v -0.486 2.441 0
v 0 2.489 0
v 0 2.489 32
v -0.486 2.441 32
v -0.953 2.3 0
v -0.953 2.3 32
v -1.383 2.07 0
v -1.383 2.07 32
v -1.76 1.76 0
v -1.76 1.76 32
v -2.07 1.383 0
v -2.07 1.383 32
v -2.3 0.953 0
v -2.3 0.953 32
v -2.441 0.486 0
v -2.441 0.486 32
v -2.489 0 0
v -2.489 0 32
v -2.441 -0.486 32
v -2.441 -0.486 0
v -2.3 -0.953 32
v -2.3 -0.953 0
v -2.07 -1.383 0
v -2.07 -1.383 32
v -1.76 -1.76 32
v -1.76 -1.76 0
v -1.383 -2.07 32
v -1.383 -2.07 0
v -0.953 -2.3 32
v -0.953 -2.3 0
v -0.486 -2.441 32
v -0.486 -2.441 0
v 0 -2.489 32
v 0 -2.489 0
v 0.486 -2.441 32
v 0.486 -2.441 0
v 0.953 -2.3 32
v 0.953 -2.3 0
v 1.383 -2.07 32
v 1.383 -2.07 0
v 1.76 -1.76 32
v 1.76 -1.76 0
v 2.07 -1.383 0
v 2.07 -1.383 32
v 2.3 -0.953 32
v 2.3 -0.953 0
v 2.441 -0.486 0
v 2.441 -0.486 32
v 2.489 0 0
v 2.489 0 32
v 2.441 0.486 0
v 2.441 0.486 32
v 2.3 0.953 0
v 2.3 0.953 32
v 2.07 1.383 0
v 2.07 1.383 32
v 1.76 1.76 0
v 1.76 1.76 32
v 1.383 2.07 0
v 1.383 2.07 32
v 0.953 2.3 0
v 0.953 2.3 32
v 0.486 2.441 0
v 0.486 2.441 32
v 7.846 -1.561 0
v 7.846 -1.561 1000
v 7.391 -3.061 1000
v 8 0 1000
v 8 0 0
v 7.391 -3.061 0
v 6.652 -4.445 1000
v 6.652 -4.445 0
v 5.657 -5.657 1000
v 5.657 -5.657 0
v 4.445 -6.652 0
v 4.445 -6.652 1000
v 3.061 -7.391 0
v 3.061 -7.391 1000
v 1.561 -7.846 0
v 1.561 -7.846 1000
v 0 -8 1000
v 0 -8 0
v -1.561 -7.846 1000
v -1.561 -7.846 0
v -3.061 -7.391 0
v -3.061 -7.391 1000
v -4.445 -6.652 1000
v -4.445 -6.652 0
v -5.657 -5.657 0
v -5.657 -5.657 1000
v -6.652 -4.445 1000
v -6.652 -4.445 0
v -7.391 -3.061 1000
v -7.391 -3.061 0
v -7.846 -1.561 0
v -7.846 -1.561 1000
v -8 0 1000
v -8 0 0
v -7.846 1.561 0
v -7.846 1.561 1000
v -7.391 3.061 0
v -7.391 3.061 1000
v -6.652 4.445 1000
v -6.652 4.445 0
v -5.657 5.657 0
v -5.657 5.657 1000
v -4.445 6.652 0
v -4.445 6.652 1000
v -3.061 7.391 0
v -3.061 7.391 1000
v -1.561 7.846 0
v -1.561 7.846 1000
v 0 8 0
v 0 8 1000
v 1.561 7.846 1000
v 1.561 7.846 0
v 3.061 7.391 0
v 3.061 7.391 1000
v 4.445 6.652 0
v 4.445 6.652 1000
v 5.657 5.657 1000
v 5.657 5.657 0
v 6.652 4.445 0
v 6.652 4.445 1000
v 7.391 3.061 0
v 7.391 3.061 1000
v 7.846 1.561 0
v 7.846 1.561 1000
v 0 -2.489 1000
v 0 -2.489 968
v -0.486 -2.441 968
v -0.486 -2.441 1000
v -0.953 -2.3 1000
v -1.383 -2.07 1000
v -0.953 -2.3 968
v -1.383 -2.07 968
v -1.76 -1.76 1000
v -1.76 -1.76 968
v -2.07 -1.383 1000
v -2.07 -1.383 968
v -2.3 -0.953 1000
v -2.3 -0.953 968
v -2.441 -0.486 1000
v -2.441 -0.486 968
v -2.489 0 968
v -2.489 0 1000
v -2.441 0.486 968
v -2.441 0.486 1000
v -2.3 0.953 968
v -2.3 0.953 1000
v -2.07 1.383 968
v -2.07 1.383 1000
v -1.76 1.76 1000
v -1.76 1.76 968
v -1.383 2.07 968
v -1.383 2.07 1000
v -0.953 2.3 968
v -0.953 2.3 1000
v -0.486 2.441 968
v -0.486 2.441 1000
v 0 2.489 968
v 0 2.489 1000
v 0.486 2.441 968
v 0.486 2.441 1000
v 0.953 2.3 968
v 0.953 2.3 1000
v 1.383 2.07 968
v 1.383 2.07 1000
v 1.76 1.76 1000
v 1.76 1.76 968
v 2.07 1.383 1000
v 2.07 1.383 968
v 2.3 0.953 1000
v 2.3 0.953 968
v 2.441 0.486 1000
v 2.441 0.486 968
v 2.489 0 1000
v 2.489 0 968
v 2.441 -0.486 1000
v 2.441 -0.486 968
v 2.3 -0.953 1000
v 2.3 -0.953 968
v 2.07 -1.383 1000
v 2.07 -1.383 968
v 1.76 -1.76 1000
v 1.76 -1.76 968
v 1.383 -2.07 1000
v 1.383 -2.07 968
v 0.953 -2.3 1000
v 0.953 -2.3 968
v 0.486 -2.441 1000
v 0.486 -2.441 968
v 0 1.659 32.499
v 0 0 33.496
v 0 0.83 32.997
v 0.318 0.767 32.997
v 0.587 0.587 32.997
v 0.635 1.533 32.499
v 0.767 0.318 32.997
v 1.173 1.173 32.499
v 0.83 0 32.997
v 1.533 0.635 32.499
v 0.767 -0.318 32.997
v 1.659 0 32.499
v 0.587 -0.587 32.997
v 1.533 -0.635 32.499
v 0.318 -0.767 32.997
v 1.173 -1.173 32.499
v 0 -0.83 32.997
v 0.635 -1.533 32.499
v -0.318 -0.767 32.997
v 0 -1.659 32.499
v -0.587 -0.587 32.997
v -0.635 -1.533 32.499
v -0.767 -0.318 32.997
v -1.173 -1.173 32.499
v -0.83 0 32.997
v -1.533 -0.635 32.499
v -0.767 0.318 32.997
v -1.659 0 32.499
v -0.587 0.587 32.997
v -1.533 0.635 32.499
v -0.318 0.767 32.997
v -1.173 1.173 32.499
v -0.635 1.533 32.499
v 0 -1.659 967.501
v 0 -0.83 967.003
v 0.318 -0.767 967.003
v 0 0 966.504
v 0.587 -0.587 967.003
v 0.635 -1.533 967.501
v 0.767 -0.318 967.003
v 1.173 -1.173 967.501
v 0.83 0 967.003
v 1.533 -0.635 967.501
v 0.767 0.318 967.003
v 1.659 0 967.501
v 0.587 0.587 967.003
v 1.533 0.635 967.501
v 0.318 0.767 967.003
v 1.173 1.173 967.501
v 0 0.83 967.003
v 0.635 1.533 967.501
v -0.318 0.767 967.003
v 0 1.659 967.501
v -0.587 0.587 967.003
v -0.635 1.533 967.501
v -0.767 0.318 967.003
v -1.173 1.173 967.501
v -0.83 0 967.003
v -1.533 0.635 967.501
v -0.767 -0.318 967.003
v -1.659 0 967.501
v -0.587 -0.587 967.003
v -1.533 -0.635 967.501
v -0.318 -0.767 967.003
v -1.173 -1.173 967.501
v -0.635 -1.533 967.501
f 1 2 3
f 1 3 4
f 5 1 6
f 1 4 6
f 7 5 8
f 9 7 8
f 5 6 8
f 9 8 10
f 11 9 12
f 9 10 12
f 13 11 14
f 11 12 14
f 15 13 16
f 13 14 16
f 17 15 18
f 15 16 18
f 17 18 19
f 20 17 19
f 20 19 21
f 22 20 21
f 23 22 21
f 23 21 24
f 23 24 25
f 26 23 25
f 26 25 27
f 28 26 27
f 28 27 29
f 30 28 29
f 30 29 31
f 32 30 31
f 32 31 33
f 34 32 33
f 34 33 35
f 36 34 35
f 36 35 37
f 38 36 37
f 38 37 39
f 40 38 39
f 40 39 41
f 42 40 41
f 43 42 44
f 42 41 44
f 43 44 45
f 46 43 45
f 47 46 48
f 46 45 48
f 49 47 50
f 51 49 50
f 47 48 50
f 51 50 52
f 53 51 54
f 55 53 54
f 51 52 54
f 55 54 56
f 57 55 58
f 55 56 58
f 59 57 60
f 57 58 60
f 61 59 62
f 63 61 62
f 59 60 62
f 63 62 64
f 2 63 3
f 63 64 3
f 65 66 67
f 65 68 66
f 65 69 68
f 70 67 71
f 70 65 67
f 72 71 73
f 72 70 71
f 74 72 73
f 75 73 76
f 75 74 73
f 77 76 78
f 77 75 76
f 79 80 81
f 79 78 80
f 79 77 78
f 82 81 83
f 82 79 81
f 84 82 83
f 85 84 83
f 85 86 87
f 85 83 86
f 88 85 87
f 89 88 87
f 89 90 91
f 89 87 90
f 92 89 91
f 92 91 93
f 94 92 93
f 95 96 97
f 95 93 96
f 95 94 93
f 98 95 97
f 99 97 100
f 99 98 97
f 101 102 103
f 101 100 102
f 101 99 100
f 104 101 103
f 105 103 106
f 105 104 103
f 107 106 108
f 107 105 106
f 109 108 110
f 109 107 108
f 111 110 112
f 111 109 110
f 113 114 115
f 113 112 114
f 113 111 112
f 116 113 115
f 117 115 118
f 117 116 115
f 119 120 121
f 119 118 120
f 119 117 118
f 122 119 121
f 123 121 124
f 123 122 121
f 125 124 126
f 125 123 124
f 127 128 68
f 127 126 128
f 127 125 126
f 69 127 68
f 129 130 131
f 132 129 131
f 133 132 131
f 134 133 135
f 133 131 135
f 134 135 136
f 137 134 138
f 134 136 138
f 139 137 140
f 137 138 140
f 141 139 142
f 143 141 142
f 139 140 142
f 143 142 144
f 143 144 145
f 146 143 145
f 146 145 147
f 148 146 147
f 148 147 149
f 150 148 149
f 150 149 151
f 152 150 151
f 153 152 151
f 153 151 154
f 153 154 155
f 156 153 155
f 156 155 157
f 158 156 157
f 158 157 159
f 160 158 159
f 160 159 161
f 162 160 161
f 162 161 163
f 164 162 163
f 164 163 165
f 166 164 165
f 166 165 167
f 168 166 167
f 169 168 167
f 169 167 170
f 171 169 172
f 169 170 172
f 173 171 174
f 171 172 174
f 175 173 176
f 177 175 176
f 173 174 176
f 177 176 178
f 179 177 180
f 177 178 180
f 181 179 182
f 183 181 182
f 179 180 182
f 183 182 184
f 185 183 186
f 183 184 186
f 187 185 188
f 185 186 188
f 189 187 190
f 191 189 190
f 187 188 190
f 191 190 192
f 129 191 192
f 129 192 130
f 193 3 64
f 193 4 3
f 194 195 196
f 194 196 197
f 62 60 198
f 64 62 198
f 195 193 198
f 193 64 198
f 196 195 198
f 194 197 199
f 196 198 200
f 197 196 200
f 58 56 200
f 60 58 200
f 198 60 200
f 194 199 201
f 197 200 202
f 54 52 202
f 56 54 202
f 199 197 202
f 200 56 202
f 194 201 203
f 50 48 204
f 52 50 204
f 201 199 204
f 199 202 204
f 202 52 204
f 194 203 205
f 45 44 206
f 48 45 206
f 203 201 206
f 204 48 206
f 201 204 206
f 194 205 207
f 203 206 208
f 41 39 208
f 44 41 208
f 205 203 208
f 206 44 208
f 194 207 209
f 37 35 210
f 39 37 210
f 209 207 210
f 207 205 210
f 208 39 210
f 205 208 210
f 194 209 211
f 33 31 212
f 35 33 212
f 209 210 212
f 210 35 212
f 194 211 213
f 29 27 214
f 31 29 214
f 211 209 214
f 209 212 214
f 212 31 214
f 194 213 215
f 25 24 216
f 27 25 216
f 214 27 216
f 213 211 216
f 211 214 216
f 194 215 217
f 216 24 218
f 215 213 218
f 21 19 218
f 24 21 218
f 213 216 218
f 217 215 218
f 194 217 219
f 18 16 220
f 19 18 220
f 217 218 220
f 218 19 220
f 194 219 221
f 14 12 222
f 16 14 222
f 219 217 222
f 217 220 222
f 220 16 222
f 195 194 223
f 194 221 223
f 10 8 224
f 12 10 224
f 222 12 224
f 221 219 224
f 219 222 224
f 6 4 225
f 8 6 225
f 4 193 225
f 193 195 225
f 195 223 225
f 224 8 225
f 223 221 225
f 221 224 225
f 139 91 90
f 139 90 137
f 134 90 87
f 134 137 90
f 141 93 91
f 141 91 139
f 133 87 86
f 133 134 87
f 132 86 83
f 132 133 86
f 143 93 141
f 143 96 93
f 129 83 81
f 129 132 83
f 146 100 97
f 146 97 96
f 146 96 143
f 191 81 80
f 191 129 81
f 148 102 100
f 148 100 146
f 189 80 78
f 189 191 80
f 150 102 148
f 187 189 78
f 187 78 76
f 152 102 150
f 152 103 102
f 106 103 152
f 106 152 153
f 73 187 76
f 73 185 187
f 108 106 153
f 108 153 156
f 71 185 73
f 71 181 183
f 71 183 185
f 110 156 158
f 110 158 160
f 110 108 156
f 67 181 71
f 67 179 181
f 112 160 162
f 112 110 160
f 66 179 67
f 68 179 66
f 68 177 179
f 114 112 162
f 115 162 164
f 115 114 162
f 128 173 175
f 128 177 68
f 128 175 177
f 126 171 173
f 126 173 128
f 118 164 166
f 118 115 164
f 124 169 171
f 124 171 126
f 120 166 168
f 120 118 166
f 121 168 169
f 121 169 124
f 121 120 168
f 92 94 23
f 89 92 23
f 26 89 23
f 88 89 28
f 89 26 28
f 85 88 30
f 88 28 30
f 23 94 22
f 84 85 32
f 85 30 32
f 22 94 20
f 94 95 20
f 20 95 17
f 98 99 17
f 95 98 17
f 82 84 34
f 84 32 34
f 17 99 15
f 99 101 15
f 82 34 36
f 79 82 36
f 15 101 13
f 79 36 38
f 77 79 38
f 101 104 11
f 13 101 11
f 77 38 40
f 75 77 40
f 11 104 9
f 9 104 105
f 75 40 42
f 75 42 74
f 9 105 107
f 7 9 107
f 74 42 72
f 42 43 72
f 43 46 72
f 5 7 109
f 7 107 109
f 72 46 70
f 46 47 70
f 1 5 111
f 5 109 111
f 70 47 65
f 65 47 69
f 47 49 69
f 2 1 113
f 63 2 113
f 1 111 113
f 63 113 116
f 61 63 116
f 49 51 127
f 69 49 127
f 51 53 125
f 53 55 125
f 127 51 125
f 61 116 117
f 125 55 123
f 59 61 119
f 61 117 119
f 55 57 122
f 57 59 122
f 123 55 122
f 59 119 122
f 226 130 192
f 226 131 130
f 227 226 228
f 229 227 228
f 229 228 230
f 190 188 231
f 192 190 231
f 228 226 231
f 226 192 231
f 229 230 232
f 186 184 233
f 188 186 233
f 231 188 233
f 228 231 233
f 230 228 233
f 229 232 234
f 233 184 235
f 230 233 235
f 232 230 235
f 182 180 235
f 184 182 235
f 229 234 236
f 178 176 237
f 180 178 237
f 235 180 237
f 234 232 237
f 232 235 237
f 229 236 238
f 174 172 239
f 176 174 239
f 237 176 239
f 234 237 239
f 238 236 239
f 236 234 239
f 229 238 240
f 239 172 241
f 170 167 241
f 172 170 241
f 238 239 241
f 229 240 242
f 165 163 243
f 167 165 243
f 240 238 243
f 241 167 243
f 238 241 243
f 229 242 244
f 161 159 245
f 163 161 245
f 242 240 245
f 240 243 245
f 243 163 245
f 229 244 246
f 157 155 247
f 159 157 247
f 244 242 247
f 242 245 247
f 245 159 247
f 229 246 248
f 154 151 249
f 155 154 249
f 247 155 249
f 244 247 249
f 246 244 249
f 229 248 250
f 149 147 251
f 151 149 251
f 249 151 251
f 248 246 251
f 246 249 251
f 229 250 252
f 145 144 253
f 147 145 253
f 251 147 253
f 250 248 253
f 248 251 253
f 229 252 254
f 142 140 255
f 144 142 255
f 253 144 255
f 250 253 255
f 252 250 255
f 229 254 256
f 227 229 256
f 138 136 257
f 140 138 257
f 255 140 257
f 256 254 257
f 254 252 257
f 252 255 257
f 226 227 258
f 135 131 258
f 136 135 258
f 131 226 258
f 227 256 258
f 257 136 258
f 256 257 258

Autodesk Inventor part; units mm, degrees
ref_plane "YZ Plane" through (0, 0, 0) normal (1, 0, 0) x (0, 1, 0)
ref_plane "XZ Plane" through (0, 0, 0) normal (0, 1, 0) x (-1, 0, 0)
ref_plane "XY Plane" through (0, 0, 0) normal (0, 0, 1) x (1, 0, 0)
sketch "Szkic1" plane through (0, 0, 0) normal (0, 0, 1) x (1, 0, 0)
  circle A0 centre (0, 0) radius 8
  line L0 (0, 8) -> (0, 0) construction
  dimension "d0" = 16
extrude "Wyciągnięcie proste1" add sketch "Szkic1" along normal blind 1000
sketch "Szkic2" plane through (0, 0, 1000) normal (0, 0, 1) x (1, 0, 0)
  circle A0 centre (0, 0) radius 8 projected
  line L0 (0, 8) -> (0, -8)
  line L1 (-8, 0) -> (8, 0)
hole "Otwór1" at (0, 0, 1000) direction (0, 0, -1) diameter 4.9784 depth 32 tip angle 118 thread size "1/4-20 UNC" class "2B" standard "ANSI Unified Screw Threads"
sketch "Szkic3" plane through (0, 0, 0) normal (0, 0, -1) x (-1, 0, 0)
  circle A0 centre (0, 0) radius 8 projected
  line L0 (0, 8) -> (0, -8)
  line L1 (-8, 0) -> (8, 0)
hole "Otwór2" at (0, 0, 0) direction (0, 0, 1) diameter 4.9784 depth 32 tip angle 118 thread size "1/4-20 UNC" class "2B" standard "ANSI Unified Screw Threads"
properties part number "walek_liniowy_fi16_L1000"
